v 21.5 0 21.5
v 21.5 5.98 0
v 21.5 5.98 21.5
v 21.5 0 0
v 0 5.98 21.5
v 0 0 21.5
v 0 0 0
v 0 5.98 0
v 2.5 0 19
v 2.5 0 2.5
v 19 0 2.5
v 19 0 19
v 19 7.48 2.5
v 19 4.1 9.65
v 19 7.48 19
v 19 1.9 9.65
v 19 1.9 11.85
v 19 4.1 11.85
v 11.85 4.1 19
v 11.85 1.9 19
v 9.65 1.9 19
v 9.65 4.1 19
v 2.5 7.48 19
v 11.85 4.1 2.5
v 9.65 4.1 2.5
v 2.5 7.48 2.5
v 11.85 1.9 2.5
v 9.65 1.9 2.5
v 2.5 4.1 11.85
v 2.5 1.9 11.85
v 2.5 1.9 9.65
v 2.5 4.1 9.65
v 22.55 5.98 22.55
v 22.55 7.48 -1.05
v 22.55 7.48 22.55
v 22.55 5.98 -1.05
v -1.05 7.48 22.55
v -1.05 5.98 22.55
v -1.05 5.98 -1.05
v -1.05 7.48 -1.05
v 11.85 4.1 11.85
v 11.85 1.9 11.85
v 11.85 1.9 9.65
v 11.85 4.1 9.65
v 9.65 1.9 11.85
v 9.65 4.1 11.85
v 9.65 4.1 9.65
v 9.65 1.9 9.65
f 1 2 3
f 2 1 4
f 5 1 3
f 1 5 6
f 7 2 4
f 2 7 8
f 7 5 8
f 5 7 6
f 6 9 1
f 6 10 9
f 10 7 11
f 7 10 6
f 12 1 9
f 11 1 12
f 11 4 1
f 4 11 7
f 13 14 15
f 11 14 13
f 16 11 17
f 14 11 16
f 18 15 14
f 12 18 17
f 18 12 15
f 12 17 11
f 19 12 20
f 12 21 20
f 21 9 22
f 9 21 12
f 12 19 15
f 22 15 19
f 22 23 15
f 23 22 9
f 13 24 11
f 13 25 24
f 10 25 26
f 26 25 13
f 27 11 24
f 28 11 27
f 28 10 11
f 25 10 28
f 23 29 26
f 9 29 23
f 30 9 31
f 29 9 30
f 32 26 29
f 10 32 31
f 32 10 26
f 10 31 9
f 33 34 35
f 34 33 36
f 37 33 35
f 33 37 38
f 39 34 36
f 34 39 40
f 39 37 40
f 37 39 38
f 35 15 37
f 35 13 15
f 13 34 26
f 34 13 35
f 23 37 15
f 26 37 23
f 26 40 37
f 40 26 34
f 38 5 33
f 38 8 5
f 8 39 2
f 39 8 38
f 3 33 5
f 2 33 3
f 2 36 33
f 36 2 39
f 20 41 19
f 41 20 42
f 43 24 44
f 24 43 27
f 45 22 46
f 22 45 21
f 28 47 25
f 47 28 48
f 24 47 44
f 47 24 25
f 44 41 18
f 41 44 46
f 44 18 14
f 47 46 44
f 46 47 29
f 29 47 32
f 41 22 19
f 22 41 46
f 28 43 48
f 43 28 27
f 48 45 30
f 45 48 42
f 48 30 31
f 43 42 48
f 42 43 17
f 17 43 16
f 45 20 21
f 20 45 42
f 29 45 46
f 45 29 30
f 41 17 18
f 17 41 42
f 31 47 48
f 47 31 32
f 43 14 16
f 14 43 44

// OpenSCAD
// =========================================================
// JANELA DE ENCAIXE PARA VAO 22x22 - CASINHA MODULAR
// Auditado para OpenSCAD 2021.01
// =========================================================

// --- Dimensoes do vao na parede ---
largura_vao_janela = 22;      // Largura do recorte na parede
altura_vao_janela  = 22;      // Altura do recorte na parede
espessura_parede   = 8;       // Espessura da parede

// --- Folga e encaixe ---
folga_encaixe      = 0.25;    // Folga perimetral (ajuste conforme Ender 3 + PLA)
profundidade_corpo = 6.0;     // Parte que entra dentro do vao de 8 mm
espessura_borda    = 2.5;     // Largura do aro/moldura da janela
tem_aba_batente    = true;    // Pequena aba para limitar o encaixe
espessura_aba      = 1.5;     // Espessura da aba
folga_aba          = 0.8;     // Quanto a aba avanca alem do vao

// --- Detalhe interno (grade / divisoria) ---
tipo_miolo         = "cruz";  // "cruz", "horizontal", "vertical" ou "nenhum"
espessura_barra    = 2.2;

// Resolucao
$fn = 48;

module janela_encaixe() {
    larg_interna = largura_vao_janela - (2 * folga_encaixe);
    alt_interna  = altura_vao_janela - (2 * folga_encaixe);

    // Garante que a abertura interna do caixilho seja positiva
    abertura_x = max(2, larg_interna - (2 * espessura_borda));
    abertura_z = max(2, alt_interna - (2 * espessura_borda));
    x_abertura = (larg_interna - abertura_x) / 2;
    z_abertura = (alt_interna - abertura_z) / 2;

    union() {
        // Caixilho principal que entra no vao de 22x22 mm
        difference() {
            cube([larg_interna, profundidade_corpo, alt_interna]);

            translate([x_abertura, -0.1, z_abertura])
                cube([abertura_x, profundidade_corpo + 0.2, abertura_z]);
        }

        // Aba/moldura frontal para encosto na face da parede
        if (tem_aba_batente) {
            larg_aba = largura_vao_janela + (2 * folga_aba);
            alt_aba  = altura_vao_janela + (2 * folga_aba);
            dx_aba   = (larg_aba - larg_interna) / 2;
            dz_aba   = (alt_aba - alt_interna) / 2;

            difference() {
                translate([-dx_aba, profundidade_corpo - 0.02, -dz_aba])
                    cube([larg_aba, espessura_aba, alt_aba]);

                translate([x_abertura, profundidade_corpo - 0.12, z_abertura])
                    cube([abertura_x, espessura_aba + 0.24, abertura_z]);
            }
        }

        // Barras internas de acordo com tipo_miolo
        if (tipo_miolo == "cruz" || tipo_miolo == "vertical") {
            translate([
                (larg_interna - espessura_barra) / 2,
                (profundidade_corpo - espessura_barra) / 2,
                espessura_borda - 0.05
            ])
            cube([espessura_barra, espessura_barra, abertura_z + 0.1]);
        }

        if (tipo_miolo == "cruz" || tipo_miolo == "horizontal") {
            translate([
                espessura_borda - 0.05,
                (profundidade_corpo - espessura_barra) / 2,
                (alt_interna - espessura_barra) / 2
            ])
            cube([abertura_x + 0.1, espessura_barra, espessura_barra]);
        }
    }
}

janela_encaixe();
